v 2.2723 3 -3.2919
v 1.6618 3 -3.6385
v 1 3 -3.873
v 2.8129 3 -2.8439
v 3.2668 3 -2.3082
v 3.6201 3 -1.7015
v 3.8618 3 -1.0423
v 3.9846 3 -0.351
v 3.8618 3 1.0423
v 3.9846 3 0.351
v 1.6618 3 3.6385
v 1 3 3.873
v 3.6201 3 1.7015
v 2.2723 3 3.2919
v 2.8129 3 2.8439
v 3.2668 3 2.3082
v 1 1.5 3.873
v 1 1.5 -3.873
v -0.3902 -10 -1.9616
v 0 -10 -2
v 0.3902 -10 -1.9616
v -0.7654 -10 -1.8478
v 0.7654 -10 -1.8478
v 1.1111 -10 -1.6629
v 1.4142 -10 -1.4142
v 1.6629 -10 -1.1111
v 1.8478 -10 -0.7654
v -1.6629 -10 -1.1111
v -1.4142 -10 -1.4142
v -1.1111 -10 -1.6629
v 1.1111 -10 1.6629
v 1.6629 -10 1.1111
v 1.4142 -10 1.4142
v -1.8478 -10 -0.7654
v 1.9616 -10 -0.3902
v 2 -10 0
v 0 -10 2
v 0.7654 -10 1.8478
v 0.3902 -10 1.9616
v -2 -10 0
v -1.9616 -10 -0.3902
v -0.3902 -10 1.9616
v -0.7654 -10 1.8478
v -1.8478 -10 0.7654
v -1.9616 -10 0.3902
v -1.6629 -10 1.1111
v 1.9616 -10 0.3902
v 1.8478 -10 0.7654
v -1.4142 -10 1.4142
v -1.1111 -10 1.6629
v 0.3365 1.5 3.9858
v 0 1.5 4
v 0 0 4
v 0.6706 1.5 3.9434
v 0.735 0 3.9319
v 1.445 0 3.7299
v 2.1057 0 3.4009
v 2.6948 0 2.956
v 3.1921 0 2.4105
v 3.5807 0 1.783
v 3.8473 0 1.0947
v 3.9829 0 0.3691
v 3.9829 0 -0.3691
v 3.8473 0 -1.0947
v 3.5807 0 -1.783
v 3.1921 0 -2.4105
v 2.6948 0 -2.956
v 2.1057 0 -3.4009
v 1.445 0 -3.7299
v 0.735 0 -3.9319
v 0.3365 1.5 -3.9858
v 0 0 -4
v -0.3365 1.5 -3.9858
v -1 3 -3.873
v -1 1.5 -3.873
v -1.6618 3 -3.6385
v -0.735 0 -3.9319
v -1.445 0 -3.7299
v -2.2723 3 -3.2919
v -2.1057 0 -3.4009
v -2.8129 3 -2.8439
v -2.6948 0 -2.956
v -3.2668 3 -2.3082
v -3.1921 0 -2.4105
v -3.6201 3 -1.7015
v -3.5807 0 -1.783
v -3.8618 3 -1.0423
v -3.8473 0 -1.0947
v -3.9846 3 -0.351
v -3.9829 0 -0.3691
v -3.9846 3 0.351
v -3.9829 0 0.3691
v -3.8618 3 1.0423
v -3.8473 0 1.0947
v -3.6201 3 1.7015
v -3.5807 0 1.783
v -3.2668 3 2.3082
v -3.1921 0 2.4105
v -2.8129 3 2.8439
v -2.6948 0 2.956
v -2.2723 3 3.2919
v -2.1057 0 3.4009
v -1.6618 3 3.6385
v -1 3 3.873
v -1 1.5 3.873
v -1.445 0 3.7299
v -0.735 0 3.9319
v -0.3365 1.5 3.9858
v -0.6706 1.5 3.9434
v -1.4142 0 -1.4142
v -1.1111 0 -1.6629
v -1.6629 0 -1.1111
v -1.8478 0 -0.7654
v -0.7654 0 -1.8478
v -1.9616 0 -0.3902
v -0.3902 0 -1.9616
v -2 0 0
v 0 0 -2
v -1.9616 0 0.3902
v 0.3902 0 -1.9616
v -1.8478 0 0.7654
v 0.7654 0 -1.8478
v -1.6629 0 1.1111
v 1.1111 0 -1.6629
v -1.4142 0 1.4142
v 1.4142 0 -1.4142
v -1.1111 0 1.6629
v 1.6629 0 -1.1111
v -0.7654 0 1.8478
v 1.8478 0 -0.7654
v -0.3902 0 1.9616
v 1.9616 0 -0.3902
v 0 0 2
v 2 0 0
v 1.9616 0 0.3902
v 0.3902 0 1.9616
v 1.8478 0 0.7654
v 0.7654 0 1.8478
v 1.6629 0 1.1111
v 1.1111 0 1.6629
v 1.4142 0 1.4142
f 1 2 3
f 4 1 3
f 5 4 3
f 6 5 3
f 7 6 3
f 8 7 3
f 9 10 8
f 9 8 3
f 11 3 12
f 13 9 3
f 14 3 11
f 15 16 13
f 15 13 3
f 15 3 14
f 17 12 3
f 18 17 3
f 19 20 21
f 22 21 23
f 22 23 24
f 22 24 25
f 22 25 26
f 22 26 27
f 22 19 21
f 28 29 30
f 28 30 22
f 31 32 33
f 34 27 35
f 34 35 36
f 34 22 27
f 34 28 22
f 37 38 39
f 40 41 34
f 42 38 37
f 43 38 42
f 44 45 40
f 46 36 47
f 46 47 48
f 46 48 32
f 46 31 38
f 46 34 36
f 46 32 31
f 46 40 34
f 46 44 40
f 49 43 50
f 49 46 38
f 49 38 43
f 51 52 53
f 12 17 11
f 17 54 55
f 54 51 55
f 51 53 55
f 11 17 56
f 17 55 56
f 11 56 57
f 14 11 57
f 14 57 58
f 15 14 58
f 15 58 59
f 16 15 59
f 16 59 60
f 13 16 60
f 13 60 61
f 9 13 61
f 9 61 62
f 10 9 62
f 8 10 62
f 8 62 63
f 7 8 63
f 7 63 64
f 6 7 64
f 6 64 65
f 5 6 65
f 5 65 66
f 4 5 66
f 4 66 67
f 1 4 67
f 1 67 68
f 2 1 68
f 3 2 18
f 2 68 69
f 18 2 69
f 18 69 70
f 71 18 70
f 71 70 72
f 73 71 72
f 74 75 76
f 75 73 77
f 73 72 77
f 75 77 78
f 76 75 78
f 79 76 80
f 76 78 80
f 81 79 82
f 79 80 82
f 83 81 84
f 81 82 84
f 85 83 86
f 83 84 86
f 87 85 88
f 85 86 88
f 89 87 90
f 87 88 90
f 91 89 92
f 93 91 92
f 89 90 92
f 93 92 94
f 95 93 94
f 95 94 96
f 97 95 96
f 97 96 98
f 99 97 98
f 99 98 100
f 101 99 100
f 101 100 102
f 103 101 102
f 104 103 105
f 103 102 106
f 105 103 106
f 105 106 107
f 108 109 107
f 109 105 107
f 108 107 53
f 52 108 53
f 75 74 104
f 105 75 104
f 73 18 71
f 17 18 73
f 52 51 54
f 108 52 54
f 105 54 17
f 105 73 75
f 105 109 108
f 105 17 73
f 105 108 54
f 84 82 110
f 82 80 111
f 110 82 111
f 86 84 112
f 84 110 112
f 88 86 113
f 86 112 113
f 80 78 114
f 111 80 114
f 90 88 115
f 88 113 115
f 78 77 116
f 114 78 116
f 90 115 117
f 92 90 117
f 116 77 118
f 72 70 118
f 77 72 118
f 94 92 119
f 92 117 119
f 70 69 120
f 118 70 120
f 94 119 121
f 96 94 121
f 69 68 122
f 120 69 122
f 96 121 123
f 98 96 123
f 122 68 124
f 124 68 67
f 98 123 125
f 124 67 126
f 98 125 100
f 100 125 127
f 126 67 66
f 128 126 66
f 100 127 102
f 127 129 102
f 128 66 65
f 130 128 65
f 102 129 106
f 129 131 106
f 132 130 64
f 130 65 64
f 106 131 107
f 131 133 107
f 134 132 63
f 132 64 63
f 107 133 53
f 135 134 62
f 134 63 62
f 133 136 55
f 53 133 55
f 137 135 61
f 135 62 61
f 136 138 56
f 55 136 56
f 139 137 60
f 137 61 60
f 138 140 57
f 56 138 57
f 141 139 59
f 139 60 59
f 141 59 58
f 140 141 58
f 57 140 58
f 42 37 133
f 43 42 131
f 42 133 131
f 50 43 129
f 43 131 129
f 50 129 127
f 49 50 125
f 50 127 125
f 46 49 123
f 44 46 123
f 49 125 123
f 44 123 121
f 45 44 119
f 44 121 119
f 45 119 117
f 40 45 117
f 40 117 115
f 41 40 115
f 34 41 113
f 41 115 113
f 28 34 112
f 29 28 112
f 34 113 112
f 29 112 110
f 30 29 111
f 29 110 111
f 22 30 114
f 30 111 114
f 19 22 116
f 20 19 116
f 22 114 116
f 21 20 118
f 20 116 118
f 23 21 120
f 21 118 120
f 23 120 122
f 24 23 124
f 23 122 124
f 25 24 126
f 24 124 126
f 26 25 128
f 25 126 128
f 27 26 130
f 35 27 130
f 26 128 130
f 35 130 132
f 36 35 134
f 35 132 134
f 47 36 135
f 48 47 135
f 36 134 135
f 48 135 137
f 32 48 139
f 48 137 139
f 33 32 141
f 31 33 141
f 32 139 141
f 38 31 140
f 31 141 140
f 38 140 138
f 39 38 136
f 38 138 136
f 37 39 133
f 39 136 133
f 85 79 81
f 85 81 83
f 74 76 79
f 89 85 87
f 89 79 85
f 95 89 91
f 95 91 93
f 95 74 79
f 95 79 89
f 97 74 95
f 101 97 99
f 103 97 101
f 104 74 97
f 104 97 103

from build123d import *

# Parameters (mm, degrees)
SKETCH1_R          = 4
EXTRUDE1_DEPTH     = 3
CUT_EXTRUDE1_DEPTH = 1.5
SKETCH3_R          = 2
EXTRUDE2_DEPTH     = 10


with BuildPart() as part:
    # Sketch1 → Extrude1 (new body)
    with BuildSketch(Plane(origin=(0, 0, 0), x_dir=(1, 0, 0), z_dir=(0, 1, 0))):
        with Locations(Location((0, 0, 0), (0, 0, 270))):  # turned: the seam where the file's is
            Circle(SKETCH1_R)
    extrude(amount=EXTRUDE1_DEPTH)

    # Sketch2 → Cut-Extrude1 (cut)
    with BuildSketch(Plane(origin=(0, 3, 0), x_dir=(-1, 0, 0), z_dir=(0, 1, 0))):
        Polygon((0, 4.401224563), (-1, 4.401224563), (-1, -5.078336035), (1, -5.078336035), (1, 4.401224563), align=None)
    extrude(amount=-CUT_EXTRUDE1_DEPTH, mode=Mode.SUBTRACT)

    # Sketch3 → Extrude2 (add)
    with BuildSketch(Plane.XZ):
        with Locations(Location((0, 0, 0), (0, 0, 90))):  # turned: the seam where the file's is
            Circle(SKETCH3_R)
    extrude(amount=EXTRUDE2_DEPTH)


solid = part.part
